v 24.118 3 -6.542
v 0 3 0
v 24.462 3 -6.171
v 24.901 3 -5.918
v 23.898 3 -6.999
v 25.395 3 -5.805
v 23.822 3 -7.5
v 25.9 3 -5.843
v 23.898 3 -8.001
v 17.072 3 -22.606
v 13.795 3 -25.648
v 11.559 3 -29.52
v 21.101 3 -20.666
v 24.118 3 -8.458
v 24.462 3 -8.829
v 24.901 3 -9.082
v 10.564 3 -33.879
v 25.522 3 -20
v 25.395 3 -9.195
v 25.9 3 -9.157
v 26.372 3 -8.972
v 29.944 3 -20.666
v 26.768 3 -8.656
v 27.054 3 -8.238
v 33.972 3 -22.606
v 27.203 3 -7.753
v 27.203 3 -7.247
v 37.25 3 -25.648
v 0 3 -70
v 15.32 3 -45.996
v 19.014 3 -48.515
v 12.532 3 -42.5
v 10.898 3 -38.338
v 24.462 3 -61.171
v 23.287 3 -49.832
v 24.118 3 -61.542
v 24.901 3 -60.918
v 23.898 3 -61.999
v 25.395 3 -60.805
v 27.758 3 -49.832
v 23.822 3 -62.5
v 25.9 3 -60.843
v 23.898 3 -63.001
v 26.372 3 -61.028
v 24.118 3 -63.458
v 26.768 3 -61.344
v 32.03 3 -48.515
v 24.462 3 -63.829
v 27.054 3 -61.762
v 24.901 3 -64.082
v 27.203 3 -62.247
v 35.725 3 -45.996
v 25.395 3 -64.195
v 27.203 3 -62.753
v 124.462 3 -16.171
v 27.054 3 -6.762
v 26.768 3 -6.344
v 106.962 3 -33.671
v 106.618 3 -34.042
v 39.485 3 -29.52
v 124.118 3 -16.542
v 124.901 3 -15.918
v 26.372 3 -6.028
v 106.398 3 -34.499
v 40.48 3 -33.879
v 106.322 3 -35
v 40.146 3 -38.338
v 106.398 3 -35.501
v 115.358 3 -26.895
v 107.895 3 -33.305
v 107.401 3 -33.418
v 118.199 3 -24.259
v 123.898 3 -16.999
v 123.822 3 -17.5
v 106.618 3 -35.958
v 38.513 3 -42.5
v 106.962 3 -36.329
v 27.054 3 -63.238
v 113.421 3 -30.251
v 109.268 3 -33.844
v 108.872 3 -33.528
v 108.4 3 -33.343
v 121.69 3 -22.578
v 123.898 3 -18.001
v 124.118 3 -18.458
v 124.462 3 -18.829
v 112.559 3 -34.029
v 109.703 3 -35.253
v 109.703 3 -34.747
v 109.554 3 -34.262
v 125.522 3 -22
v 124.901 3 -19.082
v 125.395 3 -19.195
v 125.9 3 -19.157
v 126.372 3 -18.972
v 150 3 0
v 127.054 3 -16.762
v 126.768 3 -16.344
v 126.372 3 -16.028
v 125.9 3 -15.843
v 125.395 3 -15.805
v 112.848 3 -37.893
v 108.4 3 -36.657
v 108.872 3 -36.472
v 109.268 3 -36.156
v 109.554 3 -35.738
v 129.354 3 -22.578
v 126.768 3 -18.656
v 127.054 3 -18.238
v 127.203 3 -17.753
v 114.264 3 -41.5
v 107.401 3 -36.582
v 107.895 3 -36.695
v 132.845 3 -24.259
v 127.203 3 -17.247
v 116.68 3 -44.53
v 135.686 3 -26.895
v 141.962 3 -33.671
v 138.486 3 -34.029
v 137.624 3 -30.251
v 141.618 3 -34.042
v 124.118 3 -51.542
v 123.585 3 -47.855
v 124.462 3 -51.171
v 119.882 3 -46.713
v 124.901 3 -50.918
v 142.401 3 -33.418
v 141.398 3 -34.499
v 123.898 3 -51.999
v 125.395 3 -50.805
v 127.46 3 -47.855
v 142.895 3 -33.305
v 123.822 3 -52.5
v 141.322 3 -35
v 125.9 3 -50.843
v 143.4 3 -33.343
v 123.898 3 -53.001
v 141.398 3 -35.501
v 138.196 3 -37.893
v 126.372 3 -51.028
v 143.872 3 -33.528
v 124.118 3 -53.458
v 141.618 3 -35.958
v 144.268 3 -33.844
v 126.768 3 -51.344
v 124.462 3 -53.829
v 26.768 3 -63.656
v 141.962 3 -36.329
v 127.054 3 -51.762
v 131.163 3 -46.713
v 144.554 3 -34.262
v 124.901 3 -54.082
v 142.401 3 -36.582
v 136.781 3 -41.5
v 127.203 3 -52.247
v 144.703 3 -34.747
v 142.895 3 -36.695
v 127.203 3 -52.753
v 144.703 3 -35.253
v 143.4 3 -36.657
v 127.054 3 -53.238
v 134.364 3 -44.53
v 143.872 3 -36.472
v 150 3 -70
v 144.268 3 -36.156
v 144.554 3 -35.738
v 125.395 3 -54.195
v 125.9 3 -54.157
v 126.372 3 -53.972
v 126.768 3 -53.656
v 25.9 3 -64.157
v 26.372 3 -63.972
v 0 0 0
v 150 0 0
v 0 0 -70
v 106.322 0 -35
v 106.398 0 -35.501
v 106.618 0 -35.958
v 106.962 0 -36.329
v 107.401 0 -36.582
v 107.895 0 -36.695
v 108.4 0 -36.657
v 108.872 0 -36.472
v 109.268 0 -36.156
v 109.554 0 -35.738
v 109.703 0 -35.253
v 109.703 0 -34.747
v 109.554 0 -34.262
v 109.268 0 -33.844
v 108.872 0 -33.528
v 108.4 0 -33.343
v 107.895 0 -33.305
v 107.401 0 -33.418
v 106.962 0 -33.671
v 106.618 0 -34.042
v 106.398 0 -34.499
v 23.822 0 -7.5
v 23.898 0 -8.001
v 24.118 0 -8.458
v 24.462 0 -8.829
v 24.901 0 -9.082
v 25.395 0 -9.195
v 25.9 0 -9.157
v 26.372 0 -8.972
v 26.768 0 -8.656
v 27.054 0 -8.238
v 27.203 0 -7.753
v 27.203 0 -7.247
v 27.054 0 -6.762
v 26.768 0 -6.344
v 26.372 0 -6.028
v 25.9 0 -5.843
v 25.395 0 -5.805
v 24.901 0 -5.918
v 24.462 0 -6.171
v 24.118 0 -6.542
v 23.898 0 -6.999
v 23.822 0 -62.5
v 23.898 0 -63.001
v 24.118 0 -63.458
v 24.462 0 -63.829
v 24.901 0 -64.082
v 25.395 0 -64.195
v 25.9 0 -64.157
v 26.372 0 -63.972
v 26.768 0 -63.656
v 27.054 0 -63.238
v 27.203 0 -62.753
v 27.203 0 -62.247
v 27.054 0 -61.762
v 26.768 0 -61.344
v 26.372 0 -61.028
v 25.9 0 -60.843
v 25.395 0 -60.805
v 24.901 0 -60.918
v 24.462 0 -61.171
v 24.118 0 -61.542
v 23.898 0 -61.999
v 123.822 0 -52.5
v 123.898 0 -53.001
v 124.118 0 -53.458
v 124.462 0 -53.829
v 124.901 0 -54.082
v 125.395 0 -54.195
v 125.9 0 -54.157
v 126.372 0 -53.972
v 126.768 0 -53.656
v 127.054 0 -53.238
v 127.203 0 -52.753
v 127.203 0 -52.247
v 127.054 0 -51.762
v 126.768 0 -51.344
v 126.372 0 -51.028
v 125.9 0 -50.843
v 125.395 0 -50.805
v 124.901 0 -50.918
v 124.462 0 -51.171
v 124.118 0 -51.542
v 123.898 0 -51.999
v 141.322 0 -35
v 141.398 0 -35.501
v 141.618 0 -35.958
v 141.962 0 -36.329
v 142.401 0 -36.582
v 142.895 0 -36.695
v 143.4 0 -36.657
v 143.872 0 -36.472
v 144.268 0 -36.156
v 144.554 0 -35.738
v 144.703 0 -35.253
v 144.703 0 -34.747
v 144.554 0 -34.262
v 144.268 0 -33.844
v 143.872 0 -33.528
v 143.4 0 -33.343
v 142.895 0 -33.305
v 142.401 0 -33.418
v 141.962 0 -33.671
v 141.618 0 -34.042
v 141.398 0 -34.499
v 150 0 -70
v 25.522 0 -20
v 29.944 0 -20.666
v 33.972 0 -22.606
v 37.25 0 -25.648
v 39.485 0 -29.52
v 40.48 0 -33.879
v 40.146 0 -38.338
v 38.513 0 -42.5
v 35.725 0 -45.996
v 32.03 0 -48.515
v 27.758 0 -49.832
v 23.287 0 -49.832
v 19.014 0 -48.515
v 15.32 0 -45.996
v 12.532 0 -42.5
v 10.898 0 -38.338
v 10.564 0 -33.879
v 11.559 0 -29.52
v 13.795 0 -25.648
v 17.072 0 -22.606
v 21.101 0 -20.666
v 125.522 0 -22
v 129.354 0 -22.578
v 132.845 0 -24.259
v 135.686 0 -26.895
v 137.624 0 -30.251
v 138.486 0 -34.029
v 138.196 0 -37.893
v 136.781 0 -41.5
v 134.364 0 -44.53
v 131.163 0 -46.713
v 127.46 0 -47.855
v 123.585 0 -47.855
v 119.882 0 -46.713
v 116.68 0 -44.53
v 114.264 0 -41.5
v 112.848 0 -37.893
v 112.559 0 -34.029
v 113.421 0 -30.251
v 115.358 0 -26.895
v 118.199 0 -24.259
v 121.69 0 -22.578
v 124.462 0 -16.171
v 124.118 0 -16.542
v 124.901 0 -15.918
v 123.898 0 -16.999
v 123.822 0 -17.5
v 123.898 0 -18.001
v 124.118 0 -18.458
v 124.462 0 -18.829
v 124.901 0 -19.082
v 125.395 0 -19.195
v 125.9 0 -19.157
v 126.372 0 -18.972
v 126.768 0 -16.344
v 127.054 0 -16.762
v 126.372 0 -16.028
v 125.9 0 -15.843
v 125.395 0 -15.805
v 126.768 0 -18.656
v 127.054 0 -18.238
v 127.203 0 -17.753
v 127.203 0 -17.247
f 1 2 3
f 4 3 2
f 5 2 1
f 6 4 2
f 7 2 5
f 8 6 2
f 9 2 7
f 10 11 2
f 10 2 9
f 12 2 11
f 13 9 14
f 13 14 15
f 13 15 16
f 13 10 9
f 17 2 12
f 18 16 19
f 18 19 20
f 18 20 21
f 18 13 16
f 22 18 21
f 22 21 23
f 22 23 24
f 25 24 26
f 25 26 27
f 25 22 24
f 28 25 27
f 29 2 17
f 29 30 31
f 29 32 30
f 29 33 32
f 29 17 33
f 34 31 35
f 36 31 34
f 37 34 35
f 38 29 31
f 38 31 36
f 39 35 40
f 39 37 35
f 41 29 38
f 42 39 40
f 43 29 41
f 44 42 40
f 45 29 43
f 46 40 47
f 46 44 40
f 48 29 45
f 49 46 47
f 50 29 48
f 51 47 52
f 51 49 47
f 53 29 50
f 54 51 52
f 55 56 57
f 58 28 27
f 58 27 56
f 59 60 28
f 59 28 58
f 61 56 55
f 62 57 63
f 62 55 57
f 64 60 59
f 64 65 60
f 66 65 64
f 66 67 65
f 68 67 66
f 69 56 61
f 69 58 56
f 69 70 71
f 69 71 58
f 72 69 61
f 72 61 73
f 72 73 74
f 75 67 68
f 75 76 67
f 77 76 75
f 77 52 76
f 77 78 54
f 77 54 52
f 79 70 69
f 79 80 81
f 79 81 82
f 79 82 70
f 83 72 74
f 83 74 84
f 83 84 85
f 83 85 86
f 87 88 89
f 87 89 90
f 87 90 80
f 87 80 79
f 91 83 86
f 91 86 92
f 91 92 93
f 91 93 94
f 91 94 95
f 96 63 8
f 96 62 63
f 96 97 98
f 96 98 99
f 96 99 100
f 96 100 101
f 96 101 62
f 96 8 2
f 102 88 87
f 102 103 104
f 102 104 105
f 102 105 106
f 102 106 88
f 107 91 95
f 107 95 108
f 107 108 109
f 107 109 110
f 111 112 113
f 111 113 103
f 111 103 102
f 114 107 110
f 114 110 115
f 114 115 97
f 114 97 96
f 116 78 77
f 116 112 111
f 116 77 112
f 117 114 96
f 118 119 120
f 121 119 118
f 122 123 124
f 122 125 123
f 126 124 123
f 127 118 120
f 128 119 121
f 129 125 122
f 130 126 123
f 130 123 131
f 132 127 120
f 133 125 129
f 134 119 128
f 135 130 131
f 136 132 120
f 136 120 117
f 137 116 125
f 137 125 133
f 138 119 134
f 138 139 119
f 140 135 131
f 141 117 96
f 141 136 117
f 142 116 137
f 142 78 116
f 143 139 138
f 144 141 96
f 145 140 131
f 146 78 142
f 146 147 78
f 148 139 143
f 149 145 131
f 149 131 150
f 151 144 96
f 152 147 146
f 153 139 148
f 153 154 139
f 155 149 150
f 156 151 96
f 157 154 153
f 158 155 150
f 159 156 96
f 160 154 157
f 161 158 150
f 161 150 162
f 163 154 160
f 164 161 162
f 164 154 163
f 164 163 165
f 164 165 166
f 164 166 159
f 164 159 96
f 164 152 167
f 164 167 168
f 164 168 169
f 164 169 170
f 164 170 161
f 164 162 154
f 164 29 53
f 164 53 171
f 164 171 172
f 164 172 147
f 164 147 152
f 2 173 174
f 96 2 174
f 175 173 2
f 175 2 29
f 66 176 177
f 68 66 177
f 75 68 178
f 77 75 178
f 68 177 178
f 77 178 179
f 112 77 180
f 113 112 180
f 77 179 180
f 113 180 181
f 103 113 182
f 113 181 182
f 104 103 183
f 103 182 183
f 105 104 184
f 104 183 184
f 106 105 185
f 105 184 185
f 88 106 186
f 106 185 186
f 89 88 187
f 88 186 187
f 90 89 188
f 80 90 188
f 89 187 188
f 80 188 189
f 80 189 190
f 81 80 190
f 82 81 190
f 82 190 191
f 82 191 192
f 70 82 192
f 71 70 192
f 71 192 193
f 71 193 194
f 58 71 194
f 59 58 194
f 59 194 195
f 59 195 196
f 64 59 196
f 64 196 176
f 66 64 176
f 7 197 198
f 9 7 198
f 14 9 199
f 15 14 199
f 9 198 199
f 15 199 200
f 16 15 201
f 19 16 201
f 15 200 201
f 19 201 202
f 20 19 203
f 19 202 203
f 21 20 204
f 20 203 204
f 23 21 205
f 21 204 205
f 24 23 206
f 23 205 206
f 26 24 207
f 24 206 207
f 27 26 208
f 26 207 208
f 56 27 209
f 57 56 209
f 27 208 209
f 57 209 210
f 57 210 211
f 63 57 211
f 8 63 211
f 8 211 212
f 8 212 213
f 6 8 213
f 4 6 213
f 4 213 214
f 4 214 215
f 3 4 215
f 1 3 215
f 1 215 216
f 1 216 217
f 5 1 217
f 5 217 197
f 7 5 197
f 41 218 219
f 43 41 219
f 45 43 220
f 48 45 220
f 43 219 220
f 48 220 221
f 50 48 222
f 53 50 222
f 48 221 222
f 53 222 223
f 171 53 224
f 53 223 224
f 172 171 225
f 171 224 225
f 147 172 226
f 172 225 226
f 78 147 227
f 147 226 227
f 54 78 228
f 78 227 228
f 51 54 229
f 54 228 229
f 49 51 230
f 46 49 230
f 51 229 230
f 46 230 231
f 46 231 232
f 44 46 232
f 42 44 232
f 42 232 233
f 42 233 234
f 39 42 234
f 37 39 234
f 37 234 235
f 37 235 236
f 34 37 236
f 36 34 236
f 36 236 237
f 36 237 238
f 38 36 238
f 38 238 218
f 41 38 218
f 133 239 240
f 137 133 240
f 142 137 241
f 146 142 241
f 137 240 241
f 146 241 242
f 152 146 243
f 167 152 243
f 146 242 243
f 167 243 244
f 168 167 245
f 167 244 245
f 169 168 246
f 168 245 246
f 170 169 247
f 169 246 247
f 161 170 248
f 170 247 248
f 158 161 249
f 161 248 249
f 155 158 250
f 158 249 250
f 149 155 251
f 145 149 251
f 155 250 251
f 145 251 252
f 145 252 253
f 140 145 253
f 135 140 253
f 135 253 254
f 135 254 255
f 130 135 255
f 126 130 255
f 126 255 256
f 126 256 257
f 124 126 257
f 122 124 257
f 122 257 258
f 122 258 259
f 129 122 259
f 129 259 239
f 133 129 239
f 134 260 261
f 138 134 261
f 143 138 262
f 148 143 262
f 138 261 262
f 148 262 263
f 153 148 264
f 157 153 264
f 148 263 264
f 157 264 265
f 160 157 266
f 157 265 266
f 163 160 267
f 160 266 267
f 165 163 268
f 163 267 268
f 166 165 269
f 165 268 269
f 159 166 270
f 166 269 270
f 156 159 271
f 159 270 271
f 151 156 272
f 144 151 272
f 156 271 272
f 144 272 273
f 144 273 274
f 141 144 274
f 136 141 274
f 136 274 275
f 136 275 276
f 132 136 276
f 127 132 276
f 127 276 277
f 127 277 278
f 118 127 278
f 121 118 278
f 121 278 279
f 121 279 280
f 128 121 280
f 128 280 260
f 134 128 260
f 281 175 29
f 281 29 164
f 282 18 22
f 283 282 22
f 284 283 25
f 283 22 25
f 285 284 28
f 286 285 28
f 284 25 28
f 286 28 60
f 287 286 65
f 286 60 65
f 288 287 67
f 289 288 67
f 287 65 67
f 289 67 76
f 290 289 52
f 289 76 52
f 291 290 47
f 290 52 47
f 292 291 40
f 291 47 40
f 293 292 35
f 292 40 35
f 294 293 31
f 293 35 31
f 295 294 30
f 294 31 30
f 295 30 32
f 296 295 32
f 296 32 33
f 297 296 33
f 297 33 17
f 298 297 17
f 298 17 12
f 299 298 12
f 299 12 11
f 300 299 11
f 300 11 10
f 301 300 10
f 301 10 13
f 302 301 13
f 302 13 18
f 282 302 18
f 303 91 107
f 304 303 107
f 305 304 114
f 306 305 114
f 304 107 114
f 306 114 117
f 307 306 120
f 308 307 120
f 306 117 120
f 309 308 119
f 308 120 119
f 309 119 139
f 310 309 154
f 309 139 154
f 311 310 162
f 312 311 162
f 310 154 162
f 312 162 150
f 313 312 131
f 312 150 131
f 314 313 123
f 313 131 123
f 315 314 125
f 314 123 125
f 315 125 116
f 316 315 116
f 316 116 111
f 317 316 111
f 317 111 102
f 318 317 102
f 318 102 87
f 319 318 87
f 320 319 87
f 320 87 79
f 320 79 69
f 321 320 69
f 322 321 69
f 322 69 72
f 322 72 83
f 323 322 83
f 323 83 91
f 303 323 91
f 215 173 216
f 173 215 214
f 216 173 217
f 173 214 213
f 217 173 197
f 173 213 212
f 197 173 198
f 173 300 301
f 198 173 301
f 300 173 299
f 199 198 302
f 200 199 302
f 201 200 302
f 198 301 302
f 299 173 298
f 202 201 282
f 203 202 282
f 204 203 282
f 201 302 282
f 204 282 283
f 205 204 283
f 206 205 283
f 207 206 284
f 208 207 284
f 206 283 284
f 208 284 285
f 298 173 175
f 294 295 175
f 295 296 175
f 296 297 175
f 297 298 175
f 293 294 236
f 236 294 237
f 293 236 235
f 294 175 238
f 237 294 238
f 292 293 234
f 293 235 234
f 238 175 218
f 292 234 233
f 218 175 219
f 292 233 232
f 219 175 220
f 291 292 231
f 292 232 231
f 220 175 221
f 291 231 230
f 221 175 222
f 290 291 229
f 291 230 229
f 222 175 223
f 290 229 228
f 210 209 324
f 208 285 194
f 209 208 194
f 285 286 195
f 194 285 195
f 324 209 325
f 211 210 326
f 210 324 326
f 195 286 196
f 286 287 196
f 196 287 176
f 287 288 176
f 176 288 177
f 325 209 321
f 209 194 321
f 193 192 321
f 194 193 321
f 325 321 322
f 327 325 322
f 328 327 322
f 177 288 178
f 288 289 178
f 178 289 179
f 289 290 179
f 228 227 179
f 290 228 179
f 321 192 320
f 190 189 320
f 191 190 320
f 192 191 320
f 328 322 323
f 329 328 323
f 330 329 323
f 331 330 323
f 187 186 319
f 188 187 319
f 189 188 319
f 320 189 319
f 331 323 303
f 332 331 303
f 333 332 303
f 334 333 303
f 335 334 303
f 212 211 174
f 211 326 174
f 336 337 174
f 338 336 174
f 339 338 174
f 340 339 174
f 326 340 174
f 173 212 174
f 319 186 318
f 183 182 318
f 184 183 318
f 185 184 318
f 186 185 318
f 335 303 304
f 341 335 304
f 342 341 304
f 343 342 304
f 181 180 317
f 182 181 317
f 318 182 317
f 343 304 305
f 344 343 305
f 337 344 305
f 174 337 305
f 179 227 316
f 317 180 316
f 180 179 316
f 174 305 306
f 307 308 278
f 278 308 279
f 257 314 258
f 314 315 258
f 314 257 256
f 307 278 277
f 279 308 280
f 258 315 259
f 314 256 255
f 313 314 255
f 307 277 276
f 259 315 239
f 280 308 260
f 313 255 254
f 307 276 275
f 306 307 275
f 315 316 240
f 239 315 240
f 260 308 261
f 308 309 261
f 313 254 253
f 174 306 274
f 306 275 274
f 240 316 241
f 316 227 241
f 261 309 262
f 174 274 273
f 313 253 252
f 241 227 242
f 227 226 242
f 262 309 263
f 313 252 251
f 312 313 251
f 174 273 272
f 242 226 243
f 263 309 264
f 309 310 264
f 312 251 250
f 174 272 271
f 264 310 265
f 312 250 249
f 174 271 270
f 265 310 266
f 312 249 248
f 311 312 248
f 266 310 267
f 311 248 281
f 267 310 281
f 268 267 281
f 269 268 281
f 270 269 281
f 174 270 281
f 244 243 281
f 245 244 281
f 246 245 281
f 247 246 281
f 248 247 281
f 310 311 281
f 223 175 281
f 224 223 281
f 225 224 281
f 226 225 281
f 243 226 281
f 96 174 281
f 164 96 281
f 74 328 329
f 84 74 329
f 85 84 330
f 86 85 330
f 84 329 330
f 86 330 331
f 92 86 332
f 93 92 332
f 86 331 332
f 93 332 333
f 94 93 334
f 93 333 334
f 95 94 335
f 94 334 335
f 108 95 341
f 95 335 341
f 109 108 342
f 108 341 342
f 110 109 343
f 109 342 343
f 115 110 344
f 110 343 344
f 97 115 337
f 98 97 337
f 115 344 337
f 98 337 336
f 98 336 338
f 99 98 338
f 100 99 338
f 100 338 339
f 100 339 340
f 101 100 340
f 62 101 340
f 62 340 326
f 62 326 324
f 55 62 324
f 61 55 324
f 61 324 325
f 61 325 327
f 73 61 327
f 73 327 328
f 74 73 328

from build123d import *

# Parameters (mm, degrees)
SKETCH1_W            = 150
SKETCH1_H            = 70
BOSS_EXTRUDE1_DEPTH  = 3
SKETCH2_R            = 15
SKETCH2_R_2          = 13
CUT_EXTRUDE1_DEPTH   = 166.556636835
M3_CLEARANCE_HOLE1_D = 3.4


with BuildPart() as part:
    # Sketch1 → Boss-Extrude1 (new body)
    with BuildSketch(Plane(origin=(0, 0, 0), x_dir=(1, 0, 0), z_dir=(0, 1, 0))):
        with Locations((75, 35)):
            Rectangle(SKETCH1_W, SKETCH1_H)
    extrude(amount=BOSS_EXTRUDE1_DEPTH)

    # Sketch2 → Cut-Extrude1 (cut, through all)
    with BuildSketch(Plane(origin=(0, 3, 0), x_dir=(1, 0, 0), z_dir=(0, 1, 0))):
        with Locations(Location((25.522198067, 35, 0), (0, 0, 270))):
            Circle(SKETCH2_R)
        with Locations(Location((125.522198067, 35, 0), (0, 0, 270))):
            Circle(SKETCH2_R_2)
    extrude(amount=-CUT_EXTRUDE1_DEPTH, mode=Mode.SUBTRACT)

    # M3 Clearance Hole1 (through all)
    with Locations(Plane(origin=(0, 3, 0), x_dir=(1, 0, 0), z_dir=(0, 1, 0))):
        with Locations((25.522198067, 62.5), (25.522198067, 7.5), (108.022198067, 35), (125.522198067, 52.5), (143.022198067, 35), (125.522198067, 17.5)):
            Hole(M3_CLEARANCE_HOLE1_D / 2)


solid = part.part
